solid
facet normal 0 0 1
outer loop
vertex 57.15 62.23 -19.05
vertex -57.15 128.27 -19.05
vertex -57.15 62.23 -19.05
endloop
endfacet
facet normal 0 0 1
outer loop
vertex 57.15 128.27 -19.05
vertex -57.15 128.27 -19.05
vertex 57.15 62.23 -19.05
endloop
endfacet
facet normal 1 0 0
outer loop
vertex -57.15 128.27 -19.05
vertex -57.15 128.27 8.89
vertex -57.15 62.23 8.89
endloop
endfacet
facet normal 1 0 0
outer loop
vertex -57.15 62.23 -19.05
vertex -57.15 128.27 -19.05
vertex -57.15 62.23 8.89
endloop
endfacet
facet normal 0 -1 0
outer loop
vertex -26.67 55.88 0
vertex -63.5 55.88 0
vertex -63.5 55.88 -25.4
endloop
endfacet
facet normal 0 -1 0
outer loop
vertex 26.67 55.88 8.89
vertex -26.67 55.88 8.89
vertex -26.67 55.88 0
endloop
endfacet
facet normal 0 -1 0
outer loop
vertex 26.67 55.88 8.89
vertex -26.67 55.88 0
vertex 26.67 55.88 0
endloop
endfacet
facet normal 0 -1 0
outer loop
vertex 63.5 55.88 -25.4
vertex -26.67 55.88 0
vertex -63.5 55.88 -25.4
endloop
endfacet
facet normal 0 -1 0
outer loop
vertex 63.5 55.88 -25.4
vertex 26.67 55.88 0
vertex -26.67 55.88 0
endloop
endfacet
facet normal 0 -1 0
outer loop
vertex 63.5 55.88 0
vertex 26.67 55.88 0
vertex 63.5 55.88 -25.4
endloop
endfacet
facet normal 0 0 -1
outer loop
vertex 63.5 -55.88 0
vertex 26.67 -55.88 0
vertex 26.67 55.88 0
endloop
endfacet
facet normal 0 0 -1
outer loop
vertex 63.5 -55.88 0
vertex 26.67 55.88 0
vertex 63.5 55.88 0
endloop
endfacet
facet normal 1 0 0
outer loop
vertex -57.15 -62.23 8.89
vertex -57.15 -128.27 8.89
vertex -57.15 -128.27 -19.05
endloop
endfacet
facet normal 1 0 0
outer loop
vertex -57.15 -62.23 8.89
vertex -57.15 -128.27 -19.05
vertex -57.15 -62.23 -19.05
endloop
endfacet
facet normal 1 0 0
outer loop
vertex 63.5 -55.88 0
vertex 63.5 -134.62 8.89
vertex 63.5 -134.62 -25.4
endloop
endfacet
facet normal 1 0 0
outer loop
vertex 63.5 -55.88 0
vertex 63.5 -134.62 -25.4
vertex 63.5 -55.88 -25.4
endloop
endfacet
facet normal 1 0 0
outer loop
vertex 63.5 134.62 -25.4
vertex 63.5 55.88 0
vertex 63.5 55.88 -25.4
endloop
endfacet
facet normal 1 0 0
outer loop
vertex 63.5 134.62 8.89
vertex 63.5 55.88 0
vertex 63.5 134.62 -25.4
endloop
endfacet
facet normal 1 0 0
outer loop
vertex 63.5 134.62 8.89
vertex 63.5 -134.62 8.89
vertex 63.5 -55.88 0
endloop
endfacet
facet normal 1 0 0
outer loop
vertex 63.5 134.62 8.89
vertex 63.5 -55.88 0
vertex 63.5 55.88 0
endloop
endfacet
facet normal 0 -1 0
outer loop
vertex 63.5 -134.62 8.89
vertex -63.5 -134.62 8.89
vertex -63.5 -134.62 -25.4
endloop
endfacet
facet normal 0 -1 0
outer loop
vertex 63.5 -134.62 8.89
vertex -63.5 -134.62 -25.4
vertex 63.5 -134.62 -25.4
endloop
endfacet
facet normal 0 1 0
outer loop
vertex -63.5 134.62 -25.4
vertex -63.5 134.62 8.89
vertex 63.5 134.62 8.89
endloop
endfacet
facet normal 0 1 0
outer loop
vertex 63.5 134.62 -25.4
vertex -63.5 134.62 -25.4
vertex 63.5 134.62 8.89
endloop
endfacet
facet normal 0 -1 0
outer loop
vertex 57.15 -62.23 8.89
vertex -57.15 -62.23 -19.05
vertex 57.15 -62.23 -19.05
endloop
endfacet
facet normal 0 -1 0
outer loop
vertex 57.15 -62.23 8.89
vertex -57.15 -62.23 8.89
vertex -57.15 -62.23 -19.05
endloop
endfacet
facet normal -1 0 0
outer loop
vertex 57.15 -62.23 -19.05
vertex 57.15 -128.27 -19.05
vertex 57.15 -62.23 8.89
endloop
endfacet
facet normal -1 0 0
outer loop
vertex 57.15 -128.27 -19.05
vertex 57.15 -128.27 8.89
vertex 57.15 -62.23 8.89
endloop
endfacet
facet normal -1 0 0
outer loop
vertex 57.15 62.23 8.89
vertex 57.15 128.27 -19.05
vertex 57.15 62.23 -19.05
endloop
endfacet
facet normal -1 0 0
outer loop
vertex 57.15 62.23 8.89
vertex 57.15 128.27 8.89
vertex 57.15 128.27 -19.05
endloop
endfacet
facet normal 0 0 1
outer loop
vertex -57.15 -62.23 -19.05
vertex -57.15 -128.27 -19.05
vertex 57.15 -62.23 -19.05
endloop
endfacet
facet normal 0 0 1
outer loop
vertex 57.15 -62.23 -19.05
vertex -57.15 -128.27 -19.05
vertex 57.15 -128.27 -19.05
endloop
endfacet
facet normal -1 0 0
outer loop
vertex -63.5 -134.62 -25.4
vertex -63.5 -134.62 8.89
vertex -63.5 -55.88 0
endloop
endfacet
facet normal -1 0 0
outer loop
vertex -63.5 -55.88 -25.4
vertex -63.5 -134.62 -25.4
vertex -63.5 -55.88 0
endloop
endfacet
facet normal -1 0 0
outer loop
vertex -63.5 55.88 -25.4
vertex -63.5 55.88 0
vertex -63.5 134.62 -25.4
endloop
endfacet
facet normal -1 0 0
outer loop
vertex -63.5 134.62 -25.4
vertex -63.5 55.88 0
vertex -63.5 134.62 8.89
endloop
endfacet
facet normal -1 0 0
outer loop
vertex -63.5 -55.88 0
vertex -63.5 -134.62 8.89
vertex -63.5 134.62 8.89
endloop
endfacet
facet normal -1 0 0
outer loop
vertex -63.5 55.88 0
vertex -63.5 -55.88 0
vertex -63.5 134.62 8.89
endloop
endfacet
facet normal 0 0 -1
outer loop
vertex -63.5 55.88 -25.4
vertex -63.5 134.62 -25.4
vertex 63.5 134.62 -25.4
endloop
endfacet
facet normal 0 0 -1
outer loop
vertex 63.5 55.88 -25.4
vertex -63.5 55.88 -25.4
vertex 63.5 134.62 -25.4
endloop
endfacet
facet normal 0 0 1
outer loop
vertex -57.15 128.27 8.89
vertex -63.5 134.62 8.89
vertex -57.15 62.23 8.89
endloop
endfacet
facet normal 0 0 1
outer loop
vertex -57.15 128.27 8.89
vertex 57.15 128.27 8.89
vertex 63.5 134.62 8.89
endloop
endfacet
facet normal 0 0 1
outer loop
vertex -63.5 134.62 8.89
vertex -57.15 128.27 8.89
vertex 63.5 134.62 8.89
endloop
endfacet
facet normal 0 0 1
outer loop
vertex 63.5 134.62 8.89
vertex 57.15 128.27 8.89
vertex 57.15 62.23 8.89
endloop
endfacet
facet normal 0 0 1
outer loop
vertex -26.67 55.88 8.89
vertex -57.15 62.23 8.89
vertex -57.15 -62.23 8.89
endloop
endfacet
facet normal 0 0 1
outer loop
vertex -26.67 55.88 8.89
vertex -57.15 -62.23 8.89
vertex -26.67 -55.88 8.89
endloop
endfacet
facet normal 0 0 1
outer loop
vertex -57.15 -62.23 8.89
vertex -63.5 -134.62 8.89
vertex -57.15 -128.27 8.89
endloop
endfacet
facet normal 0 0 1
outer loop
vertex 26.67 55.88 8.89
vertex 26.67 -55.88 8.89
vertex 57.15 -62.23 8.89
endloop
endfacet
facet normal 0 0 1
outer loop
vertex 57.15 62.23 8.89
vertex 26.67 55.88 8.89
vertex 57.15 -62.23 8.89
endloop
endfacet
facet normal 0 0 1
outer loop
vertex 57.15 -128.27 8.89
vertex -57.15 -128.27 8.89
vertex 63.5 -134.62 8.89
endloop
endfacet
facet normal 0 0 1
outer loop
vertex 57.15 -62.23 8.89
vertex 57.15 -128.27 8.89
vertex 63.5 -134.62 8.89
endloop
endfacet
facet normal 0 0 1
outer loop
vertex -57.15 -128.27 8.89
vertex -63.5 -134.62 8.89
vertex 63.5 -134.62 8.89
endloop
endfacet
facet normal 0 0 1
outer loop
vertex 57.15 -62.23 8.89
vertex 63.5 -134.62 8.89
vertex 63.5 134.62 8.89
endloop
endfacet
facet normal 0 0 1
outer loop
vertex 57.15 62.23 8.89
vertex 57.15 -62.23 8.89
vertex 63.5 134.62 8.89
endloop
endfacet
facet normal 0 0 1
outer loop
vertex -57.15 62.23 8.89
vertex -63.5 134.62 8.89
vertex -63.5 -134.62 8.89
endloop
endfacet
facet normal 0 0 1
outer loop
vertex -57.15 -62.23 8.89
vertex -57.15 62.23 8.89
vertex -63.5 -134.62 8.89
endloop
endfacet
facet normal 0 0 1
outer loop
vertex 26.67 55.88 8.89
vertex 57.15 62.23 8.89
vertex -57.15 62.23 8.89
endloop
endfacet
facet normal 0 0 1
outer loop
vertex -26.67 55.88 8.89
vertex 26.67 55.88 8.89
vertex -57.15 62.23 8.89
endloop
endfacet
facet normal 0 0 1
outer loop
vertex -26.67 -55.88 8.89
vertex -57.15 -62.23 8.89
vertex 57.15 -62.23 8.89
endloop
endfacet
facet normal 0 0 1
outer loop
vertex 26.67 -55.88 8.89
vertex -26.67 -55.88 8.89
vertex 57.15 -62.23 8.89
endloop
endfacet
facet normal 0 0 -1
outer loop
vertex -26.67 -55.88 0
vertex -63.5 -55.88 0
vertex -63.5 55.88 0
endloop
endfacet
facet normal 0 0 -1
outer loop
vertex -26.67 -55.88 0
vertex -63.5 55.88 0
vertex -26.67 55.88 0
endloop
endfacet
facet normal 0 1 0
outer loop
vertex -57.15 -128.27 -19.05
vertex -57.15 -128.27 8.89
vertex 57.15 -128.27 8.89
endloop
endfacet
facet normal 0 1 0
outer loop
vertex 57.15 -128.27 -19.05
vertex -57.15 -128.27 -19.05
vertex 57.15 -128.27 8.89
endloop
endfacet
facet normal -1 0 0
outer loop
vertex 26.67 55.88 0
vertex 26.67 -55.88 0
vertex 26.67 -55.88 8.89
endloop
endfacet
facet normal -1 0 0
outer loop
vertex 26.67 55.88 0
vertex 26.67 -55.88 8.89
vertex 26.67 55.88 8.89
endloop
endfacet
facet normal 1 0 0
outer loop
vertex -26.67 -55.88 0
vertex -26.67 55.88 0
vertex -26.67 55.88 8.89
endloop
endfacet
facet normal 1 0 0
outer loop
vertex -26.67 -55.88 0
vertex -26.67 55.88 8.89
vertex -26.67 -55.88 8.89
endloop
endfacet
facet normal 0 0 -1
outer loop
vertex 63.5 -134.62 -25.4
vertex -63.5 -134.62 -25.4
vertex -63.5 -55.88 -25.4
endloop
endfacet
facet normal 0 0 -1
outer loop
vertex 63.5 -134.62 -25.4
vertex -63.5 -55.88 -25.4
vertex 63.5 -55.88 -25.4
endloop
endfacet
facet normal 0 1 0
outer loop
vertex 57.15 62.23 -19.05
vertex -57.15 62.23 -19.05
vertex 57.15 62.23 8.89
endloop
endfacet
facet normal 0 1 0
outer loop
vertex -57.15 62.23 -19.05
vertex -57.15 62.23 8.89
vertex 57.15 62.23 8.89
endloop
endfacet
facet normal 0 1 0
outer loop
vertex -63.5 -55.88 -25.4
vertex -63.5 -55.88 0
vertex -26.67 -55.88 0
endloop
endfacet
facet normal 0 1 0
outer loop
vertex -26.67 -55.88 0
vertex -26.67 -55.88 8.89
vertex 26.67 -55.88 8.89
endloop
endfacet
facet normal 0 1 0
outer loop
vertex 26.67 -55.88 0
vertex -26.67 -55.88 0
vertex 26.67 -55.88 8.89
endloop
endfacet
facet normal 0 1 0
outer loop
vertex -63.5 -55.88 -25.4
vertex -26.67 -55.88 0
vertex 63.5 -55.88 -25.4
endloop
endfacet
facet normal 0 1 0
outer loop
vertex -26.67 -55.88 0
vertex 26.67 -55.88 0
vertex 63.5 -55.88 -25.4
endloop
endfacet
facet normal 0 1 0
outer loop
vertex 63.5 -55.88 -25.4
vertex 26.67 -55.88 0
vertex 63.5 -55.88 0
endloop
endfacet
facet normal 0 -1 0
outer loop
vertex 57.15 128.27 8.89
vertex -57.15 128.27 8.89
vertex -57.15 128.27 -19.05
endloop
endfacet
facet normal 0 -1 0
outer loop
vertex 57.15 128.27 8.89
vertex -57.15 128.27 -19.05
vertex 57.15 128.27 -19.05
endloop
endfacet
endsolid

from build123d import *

# Parameters (mm, degrees)
F1_W     = 114.3
F1_H     = 66.04
F2_DEPTH = 8.89
F3_W     = 127
F3_H     = 78.74
F3_W_2   = 114.3
F3_H_2   = 66.04
F4_DEPTH = 19.05
F5_W     = 127
F5_H     = 78.74
F6_DEPTH = 6.35


with BuildPart() as f2:
    # F1 (on Top) → F2 (new body)
    with BuildSketch(Plane.XY):
        Polygon((-63.5, 0), (-63.5, -55.88), (-63.5, -134.62), (63.5, -134.62), (63.5, -55.88), (63.5, 0), (26.67, 0), (26.67, -55.88), (-26.67, -55.88), (-26.67, 0), align=None)
        with Locations((0, -95.25)):
            Rectangle(F1_W, F1_H, mode=Mode.SUBTRACT)
    extrude(amount=F2_DEPTH)

    # F3 (on Top) → F4 (join)
    with BuildSketch(Plane.XY):
        with Locations((0, -95.25)):
            Rectangle(F3_W, F3_H)
        with Locations((0, -95.25)):
            Rectangle(F3_W_2, F3_H_2, mode=Mode.SUBTRACT)
    extrude(amount=-F4_DEPTH)

    # F5 (on face) → F6 (join)
    with BuildSketch(Plane(origin=(0, 0, -19.05), x_dir=(1, 0, 0), z_dir=(0, 0, -1))):
        with Locations((0, 95.25)):
            Rectangle(F5_W, F5_H)
    extrude(amount=F6_DEPTH)

    # F7: F2 across plane


with BuildPart() as f2_1:
    add(f2.part)
    add(f2.part.mirror(Plane.XZ))


solid = f2_1.part
